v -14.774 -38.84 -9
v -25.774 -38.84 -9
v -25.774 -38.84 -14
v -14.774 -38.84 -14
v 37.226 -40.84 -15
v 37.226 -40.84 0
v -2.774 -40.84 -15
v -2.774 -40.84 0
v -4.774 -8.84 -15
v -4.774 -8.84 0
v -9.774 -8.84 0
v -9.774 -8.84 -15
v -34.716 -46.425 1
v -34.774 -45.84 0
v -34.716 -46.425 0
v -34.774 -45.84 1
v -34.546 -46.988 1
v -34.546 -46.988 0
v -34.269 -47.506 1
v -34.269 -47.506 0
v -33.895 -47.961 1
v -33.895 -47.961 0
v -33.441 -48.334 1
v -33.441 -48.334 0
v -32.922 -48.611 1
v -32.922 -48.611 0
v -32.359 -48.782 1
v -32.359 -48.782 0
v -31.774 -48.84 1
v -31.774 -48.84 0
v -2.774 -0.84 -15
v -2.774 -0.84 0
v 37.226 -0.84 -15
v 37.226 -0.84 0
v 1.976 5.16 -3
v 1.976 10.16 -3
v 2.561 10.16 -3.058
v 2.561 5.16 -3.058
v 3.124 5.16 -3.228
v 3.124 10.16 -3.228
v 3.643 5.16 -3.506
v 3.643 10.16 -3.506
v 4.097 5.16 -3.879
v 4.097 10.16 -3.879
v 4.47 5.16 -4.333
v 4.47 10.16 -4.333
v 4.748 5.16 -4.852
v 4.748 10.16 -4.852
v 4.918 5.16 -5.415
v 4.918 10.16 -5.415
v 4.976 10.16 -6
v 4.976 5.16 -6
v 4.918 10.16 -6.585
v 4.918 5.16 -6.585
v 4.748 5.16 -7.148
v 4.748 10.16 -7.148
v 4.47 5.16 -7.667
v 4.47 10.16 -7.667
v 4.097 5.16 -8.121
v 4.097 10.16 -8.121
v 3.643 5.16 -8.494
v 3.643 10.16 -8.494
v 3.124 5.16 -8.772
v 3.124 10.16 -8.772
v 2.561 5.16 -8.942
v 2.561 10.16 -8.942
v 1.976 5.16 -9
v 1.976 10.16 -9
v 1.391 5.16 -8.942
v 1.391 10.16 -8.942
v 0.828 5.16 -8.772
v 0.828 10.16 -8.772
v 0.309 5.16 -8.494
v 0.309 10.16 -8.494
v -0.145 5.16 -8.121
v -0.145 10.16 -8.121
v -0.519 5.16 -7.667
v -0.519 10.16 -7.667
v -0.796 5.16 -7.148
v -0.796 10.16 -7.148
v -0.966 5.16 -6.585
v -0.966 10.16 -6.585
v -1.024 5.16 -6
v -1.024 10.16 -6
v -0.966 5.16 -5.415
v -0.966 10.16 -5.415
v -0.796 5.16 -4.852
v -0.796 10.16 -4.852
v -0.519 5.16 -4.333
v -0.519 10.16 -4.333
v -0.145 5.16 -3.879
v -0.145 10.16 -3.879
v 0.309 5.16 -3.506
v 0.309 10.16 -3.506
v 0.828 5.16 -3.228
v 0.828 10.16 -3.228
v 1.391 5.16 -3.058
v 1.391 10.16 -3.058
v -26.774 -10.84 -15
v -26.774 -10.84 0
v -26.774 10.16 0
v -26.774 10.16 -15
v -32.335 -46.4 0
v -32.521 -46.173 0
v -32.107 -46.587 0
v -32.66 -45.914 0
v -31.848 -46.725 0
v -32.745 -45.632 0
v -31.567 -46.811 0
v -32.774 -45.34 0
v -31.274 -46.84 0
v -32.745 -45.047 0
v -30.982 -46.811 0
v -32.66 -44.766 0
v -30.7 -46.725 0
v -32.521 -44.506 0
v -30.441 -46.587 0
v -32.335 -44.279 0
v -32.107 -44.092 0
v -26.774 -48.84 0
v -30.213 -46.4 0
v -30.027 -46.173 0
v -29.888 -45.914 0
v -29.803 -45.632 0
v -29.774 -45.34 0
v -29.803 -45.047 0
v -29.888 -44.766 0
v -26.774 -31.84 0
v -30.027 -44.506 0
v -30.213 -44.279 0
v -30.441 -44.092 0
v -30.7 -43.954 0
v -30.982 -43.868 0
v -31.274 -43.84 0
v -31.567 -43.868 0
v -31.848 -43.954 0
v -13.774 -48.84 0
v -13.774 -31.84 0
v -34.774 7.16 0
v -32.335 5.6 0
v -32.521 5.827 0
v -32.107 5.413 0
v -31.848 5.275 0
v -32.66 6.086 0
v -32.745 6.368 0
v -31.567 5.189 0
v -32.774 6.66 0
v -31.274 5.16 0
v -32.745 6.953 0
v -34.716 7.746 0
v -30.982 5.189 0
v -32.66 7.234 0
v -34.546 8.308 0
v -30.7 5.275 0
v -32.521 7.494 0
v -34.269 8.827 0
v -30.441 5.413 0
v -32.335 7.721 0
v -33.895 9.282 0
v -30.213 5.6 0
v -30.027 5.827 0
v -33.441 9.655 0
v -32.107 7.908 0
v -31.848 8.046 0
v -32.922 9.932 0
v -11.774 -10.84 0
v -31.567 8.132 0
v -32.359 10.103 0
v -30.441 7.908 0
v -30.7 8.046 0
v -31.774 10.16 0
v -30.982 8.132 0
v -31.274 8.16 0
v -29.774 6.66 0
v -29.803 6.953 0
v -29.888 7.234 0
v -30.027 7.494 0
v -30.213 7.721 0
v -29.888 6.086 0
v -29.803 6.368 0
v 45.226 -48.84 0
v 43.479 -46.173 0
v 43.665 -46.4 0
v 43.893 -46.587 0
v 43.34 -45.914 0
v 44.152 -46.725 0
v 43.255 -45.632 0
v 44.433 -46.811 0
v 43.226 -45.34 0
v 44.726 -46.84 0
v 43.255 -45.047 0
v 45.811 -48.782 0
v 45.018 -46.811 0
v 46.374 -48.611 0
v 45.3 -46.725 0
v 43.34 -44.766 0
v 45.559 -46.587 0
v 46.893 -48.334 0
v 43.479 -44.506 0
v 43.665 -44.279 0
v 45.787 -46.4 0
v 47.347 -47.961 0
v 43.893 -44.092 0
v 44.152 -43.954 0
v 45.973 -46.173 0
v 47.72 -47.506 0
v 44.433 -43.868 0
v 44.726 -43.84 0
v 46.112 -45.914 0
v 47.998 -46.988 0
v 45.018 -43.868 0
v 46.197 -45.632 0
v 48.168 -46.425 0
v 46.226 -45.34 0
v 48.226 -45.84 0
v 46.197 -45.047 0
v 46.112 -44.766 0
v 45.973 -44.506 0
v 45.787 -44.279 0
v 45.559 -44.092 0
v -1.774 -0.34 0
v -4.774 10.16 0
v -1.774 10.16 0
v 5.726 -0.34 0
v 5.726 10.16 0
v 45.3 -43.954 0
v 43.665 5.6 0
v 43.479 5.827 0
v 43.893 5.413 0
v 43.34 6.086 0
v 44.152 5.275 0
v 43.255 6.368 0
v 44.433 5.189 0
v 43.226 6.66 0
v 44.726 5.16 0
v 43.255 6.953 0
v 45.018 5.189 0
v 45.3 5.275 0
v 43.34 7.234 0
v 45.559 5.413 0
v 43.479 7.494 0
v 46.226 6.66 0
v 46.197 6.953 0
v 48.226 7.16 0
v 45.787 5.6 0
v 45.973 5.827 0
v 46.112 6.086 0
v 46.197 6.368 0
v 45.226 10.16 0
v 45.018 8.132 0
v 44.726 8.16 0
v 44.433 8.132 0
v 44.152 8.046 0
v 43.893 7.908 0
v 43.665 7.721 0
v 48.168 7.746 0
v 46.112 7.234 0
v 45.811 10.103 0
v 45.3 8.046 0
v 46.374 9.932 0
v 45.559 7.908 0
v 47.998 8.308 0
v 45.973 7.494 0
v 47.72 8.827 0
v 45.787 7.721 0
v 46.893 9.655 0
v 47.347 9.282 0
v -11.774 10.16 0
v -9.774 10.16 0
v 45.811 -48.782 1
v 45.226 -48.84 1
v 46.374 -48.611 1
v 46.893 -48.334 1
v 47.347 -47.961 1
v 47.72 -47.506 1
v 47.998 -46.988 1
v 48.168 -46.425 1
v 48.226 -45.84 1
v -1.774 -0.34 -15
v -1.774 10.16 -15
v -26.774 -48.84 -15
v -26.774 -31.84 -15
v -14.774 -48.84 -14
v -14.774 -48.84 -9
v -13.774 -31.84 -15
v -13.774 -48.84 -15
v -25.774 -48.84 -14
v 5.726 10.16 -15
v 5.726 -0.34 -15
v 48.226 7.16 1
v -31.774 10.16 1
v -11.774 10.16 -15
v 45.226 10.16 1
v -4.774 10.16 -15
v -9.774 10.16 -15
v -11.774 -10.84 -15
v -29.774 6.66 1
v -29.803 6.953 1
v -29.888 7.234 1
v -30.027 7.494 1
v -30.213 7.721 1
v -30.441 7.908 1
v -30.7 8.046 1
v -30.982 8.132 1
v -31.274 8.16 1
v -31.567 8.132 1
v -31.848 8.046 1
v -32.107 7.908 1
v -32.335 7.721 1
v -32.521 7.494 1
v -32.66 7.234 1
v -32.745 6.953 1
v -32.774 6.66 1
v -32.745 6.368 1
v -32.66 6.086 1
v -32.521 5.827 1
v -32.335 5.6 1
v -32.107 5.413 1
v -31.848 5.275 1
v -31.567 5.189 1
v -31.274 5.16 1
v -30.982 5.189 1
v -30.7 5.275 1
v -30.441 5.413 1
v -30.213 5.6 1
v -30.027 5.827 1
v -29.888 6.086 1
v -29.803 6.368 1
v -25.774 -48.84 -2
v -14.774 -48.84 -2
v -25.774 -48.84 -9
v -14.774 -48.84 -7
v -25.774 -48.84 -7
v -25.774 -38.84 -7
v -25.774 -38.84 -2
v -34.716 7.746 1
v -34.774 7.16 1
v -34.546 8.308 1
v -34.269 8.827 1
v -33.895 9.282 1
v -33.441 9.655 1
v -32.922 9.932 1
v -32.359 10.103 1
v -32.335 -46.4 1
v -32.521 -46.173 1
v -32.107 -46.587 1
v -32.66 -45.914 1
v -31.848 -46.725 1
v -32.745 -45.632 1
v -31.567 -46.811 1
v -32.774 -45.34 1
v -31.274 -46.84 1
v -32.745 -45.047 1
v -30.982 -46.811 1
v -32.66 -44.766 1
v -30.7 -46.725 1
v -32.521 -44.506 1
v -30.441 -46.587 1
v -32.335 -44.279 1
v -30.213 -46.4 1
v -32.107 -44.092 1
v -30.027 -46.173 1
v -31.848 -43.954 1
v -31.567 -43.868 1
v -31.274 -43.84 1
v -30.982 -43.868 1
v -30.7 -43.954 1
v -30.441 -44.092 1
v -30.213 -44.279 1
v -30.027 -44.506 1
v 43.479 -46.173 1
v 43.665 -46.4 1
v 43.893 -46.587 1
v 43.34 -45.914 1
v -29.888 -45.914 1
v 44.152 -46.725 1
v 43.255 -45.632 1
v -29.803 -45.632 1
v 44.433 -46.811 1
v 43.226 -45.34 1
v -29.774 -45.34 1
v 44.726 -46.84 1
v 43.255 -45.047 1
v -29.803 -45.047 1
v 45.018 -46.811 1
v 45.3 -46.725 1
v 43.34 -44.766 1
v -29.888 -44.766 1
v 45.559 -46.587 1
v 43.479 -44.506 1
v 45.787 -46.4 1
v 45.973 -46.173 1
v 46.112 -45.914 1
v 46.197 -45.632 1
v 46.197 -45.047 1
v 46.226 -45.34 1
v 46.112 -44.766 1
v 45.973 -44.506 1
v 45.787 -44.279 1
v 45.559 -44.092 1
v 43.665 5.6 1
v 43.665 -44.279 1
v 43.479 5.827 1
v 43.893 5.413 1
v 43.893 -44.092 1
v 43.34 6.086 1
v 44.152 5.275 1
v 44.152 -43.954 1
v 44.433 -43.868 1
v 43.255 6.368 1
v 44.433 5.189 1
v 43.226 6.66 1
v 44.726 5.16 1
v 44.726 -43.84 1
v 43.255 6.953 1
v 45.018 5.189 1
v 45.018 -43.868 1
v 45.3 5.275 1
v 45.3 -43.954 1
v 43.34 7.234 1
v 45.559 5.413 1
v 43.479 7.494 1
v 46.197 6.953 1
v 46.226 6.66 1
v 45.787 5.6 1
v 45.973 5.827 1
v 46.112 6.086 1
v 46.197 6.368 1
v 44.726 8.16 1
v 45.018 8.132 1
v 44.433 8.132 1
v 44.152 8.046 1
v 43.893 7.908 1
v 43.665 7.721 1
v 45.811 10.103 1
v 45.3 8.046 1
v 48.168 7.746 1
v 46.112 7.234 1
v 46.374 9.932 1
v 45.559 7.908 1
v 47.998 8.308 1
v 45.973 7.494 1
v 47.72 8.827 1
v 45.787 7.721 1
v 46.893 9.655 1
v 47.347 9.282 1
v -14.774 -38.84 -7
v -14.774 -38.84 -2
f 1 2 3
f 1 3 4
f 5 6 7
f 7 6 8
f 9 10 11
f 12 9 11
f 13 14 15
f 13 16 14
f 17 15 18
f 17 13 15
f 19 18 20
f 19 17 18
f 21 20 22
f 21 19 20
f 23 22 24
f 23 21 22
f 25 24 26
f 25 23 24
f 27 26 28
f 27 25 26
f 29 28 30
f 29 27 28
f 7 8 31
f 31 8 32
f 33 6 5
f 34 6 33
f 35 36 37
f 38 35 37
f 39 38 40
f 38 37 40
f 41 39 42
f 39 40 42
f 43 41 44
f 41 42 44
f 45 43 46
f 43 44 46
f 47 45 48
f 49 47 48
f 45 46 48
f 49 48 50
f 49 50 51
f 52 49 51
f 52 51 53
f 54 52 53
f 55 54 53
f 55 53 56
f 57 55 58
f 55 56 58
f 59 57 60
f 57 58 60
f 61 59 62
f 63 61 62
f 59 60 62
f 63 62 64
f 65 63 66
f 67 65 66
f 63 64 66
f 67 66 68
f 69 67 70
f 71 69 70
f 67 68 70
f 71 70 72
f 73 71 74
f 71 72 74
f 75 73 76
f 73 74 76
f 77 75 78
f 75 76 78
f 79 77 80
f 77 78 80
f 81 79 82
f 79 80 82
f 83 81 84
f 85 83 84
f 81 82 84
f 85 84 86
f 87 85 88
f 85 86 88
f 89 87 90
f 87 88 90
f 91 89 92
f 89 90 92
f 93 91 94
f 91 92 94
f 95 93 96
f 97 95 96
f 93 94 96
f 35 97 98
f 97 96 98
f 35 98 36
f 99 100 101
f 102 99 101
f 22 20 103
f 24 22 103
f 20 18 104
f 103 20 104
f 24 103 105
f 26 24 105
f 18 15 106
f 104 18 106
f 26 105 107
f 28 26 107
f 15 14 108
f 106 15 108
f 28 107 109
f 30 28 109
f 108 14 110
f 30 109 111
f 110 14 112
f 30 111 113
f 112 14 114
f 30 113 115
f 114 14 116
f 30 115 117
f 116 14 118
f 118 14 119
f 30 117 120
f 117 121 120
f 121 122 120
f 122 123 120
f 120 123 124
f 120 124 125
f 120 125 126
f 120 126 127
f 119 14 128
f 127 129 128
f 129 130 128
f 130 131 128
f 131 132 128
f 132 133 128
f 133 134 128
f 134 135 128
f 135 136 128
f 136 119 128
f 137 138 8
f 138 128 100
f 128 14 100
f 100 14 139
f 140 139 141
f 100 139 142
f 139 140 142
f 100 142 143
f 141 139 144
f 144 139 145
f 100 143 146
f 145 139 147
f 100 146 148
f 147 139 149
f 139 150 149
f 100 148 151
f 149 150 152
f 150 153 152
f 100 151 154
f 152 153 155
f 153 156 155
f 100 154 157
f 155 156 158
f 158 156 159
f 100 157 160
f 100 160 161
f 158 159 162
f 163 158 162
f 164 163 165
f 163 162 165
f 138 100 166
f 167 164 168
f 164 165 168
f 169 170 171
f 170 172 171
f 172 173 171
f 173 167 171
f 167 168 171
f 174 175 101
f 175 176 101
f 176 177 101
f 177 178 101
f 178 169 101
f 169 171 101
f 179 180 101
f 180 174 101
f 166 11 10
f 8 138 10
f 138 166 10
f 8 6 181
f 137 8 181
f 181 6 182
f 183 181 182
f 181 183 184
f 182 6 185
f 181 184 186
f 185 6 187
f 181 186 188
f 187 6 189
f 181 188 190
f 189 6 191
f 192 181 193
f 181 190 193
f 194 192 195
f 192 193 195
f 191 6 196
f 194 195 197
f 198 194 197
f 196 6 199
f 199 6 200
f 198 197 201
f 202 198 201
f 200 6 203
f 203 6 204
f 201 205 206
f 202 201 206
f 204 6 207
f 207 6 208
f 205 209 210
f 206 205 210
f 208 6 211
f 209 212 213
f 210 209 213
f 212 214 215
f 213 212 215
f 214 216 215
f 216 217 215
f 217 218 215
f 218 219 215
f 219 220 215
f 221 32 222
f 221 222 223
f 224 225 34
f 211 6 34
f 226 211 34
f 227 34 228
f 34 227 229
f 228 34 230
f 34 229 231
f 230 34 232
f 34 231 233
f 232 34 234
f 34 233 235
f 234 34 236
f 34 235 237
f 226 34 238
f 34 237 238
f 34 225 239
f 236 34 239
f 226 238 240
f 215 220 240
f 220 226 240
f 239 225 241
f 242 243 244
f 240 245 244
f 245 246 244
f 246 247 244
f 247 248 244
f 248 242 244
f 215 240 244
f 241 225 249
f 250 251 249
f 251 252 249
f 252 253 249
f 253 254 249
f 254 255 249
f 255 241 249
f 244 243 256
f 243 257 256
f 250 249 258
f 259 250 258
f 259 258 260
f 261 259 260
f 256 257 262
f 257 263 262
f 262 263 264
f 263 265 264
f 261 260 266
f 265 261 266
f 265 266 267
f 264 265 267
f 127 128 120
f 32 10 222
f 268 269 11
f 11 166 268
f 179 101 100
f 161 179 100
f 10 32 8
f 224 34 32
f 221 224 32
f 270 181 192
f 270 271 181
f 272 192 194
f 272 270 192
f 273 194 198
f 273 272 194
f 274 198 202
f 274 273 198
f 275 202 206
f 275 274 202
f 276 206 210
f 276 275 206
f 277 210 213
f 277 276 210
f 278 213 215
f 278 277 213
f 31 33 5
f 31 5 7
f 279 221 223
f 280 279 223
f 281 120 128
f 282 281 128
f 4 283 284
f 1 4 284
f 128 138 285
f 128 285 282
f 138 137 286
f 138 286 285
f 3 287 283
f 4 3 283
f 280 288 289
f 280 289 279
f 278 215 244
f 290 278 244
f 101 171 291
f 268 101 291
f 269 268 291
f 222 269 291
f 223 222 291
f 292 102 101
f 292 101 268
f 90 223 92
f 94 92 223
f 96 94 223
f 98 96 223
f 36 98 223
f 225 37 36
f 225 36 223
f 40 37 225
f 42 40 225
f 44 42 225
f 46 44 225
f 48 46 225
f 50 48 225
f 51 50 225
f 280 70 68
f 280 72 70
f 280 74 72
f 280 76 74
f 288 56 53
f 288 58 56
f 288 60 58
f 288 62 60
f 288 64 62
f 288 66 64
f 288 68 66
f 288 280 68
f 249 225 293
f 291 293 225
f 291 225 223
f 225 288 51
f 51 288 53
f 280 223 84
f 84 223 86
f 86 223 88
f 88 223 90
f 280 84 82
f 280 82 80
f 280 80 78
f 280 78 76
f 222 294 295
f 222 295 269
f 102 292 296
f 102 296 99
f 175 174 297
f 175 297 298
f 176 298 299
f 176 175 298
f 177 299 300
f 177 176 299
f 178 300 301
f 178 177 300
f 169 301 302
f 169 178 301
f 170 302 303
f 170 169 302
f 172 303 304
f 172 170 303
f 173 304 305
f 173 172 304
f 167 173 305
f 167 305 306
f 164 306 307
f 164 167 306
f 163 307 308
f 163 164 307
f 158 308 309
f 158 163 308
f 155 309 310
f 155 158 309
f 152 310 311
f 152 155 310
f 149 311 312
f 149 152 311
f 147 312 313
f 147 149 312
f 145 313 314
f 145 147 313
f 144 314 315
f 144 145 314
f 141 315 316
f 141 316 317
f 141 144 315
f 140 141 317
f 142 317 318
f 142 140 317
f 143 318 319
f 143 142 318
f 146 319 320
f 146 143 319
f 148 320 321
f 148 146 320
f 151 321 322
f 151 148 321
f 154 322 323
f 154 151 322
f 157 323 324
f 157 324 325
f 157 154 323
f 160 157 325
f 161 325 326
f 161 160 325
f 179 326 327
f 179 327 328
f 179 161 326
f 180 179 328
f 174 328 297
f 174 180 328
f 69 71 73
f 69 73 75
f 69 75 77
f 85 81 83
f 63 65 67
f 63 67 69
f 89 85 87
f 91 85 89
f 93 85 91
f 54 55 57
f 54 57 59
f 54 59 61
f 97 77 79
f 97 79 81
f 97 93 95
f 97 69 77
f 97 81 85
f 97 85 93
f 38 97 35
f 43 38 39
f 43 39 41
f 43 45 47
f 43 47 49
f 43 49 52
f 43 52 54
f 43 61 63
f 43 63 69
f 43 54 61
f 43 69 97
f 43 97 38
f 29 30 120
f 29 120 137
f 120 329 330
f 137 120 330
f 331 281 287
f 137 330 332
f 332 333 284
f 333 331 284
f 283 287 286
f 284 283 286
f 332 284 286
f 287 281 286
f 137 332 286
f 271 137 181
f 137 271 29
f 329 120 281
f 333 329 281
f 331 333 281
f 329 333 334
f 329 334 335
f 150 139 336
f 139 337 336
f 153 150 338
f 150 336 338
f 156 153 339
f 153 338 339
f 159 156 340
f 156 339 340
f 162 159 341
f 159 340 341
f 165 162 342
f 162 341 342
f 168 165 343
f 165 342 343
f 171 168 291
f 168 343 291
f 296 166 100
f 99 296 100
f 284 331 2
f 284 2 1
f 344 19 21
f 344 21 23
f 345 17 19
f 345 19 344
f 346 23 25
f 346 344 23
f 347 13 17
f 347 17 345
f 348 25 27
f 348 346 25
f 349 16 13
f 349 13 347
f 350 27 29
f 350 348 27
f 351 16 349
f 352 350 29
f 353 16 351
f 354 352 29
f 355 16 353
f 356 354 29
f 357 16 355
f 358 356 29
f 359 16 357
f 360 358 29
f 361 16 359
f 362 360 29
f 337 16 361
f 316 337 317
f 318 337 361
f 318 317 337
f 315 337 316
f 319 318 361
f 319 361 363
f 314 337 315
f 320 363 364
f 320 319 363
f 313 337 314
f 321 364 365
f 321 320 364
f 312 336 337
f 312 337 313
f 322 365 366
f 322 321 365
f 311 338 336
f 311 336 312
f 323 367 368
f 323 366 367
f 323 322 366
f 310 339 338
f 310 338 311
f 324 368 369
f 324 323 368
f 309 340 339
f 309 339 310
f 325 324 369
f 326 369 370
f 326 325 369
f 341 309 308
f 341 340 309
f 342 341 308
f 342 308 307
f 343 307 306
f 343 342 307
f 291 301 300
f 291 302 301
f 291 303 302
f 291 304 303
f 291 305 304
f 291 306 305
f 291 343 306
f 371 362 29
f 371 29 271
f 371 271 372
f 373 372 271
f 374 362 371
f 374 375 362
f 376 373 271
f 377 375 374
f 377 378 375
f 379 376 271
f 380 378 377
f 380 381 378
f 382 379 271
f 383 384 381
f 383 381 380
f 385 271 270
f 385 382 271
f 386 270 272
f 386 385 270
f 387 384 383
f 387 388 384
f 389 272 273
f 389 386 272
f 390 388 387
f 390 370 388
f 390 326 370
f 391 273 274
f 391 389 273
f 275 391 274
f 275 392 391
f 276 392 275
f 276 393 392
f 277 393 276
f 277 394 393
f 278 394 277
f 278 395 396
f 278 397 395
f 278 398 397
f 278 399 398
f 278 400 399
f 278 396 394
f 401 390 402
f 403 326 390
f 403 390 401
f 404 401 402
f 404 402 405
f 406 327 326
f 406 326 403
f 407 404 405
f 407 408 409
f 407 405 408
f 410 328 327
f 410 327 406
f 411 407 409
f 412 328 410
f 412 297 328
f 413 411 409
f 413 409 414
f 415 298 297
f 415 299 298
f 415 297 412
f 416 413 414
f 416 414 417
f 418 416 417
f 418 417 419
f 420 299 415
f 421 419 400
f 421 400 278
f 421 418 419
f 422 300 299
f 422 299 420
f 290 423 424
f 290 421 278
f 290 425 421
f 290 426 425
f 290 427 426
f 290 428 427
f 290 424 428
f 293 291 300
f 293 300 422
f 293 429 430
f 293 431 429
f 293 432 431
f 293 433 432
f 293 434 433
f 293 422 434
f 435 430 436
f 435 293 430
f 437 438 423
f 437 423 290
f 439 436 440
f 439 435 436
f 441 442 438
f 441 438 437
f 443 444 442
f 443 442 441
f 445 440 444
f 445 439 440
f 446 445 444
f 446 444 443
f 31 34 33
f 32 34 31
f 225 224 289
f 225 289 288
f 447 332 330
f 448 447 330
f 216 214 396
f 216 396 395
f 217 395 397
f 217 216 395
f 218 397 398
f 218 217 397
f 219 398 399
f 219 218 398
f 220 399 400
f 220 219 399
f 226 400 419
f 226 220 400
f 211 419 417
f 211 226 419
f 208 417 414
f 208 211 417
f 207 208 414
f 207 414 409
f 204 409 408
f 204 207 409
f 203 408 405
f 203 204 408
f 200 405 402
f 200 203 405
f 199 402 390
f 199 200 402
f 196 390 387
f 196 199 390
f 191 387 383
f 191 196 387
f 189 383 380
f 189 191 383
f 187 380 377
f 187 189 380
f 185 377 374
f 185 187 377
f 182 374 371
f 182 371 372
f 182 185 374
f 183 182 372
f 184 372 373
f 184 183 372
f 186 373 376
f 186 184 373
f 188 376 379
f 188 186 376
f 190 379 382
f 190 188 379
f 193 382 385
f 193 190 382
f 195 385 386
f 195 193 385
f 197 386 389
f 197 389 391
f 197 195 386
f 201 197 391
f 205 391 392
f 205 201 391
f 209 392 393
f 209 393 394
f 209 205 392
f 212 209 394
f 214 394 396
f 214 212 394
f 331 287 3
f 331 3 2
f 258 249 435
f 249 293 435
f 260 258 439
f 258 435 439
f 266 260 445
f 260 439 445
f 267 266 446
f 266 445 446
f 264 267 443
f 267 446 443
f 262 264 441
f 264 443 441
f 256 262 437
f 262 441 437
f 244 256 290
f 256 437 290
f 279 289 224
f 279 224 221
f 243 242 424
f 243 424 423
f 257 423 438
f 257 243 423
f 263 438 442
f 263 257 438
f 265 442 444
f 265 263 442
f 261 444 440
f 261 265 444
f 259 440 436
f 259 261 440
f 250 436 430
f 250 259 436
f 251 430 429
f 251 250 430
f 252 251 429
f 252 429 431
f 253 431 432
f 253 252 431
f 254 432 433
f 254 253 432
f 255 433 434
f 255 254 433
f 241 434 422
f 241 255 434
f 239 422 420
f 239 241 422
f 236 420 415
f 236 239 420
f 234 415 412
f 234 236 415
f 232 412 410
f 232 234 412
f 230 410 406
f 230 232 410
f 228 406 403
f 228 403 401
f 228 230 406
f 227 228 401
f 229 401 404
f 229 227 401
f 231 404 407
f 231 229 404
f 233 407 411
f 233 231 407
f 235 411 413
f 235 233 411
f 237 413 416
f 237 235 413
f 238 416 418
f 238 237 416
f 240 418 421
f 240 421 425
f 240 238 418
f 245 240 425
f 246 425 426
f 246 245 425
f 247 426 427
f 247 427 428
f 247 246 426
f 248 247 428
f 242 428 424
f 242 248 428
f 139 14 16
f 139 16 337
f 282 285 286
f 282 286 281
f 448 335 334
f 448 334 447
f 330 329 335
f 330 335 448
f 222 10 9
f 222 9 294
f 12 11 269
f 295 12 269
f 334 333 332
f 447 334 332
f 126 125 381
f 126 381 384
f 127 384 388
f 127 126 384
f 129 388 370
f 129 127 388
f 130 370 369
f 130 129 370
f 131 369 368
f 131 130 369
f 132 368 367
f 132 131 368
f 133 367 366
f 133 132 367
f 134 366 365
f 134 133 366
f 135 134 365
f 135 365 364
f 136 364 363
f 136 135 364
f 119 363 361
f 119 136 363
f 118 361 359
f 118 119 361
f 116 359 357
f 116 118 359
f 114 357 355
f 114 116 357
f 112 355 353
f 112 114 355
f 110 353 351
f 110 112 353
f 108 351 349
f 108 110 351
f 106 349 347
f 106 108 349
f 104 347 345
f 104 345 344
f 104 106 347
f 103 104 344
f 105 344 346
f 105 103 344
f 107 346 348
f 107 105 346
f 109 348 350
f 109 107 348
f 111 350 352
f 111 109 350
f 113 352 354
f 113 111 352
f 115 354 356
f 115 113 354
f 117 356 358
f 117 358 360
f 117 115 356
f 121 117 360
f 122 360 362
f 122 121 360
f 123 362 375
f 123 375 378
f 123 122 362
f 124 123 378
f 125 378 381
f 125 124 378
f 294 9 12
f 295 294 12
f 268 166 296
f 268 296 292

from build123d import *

# Parameters (mm, degrees)
SKETCH1_W           = 83
SKETCH1_H           = 59
SKETCH1_R           = 1.5
BOSS_EXTRUDE1_DEPTH = 1
SKETCH2_W           = 15
SKETCH2_H           = 21
SKETCH2_W_2         = 13
SKETCH2_H_2         = 17
SKETCH2_W_3         = 5
SKETCH2_H_3         = 19
SKETCH2_W_4         = 7.5
SKETCH2_H_4         = 10.5
SKETCH2_W_5         = 40
SKETCH2_H_5         = 40
BOSS_EXTRUDE2_DEPTH = 15
SKETCH3_R           = 3
CUT_EXTRUDE1_DEPTH  = 5
SKETCH4_W           = 11
SKETCH4_H           = 5
CUT_EXTRUDE2_DEPTH  = 10
FILLET1_R           = 3


with BuildPart() as part:
    # Sketch1 → Boss-Extrude1 (new body)
    with BuildSketch(Plane.XY):
        with Locations((6.725862069, -19.339655172)):
            Rectangle(SKETCH1_W, SKETCH1_H)
        with Locations((-31.274137931, 6.660344828)):
            Circle(SKETCH1_R, mode=Mode.SUBTRACT)
        with Locations((44.725862069, 6.660344828)):
            Circle(SKETCH1_R, mode=Mode.SUBTRACT)
        with Locations((44.725862069, -45.339655172)):
            Circle(SKETCH1_R, mode=Mode.SUBTRACT)
        with Locations((-31.274137931, -45.339655172)):
            Circle(SKETCH1_R, mode=Mode.SUBTRACT)
    extrude(amount=BOSS_EXTRUDE1_DEPTH)

    # Sketch2 → Boss-Extrude2 (add)
    with BuildSketch(Plane(origin=(0, 0, 0), x_dir=(-1, 0, 0), z_dir=(0, 0, -1))):
        with Locations((19.274137931, -0.339655172)):
            Rectangle(SKETCH2_W, SKETCH2_H)
        with Locations((20.274137931, -40.339655172)):
            Rectangle(SKETCH2_W_2, SKETCH2_H_2)
        with Locations((7.274137931, 0.660344828)):
            Rectangle(SKETCH2_W_3, SKETCH2_H_3)
        with Locations((-1.975862069, 4.910344828)):
            Rectangle(SKETCH2_W_4, SKETCH2_H_4)
        with Locations((-17.225862069, -20.839655172)):
            Rectangle(SKETCH2_W_5, SKETCH2_H_5)
    extrude(amount=BOSS_EXTRUDE2_DEPTH)

    # Sketch3 → Cut-Extrude1 (cut)
    with BuildSketch(Plane(origin=(0, 10.160344828, 0), x_dir=(1, 0, 0), z_dir=(0, 1, 0))):
        with Locations(Location((1.975862069, 6, 0), (0, 0, 270))):
            Circle(SKETCH3_R)
    extrude(amount=-CUT_EXTRUDE1_DEPTH, mode=Mode.SUBTRACT)

    # Sketch4 → Cut-Extrude2 (cut)
    with BuildSketch(Plane.XZ.offset(48.839655172)):
        with Locations((-20.274137931, -4.5)):
            Rectangle(SKETCH4_W, SKETCH4_H)
        with Locations((-20.274137931, -11.5)):
            Rectangle(SKETCH4_W, SKETCH4_H)
    extrude(amount=-CUT_EXTRUDE2_DEPTH, mode=Mode.SUBTRACT)

    # Fillet1
    fillet1_edges = [part.edges().sort_by_distance(p)[0] for p in [
        (48.225862069, -48.839655172, 0.5),
        (-34.774137931, -48.839655172, 0.5),
        (-34.774137931, 10.160344828, 0.5),
        (48.225862069, 10.160344828, 0.5),
    ]]
    fillet(fillet1_edges, radius=FILLET1_R)


solid = part.part
